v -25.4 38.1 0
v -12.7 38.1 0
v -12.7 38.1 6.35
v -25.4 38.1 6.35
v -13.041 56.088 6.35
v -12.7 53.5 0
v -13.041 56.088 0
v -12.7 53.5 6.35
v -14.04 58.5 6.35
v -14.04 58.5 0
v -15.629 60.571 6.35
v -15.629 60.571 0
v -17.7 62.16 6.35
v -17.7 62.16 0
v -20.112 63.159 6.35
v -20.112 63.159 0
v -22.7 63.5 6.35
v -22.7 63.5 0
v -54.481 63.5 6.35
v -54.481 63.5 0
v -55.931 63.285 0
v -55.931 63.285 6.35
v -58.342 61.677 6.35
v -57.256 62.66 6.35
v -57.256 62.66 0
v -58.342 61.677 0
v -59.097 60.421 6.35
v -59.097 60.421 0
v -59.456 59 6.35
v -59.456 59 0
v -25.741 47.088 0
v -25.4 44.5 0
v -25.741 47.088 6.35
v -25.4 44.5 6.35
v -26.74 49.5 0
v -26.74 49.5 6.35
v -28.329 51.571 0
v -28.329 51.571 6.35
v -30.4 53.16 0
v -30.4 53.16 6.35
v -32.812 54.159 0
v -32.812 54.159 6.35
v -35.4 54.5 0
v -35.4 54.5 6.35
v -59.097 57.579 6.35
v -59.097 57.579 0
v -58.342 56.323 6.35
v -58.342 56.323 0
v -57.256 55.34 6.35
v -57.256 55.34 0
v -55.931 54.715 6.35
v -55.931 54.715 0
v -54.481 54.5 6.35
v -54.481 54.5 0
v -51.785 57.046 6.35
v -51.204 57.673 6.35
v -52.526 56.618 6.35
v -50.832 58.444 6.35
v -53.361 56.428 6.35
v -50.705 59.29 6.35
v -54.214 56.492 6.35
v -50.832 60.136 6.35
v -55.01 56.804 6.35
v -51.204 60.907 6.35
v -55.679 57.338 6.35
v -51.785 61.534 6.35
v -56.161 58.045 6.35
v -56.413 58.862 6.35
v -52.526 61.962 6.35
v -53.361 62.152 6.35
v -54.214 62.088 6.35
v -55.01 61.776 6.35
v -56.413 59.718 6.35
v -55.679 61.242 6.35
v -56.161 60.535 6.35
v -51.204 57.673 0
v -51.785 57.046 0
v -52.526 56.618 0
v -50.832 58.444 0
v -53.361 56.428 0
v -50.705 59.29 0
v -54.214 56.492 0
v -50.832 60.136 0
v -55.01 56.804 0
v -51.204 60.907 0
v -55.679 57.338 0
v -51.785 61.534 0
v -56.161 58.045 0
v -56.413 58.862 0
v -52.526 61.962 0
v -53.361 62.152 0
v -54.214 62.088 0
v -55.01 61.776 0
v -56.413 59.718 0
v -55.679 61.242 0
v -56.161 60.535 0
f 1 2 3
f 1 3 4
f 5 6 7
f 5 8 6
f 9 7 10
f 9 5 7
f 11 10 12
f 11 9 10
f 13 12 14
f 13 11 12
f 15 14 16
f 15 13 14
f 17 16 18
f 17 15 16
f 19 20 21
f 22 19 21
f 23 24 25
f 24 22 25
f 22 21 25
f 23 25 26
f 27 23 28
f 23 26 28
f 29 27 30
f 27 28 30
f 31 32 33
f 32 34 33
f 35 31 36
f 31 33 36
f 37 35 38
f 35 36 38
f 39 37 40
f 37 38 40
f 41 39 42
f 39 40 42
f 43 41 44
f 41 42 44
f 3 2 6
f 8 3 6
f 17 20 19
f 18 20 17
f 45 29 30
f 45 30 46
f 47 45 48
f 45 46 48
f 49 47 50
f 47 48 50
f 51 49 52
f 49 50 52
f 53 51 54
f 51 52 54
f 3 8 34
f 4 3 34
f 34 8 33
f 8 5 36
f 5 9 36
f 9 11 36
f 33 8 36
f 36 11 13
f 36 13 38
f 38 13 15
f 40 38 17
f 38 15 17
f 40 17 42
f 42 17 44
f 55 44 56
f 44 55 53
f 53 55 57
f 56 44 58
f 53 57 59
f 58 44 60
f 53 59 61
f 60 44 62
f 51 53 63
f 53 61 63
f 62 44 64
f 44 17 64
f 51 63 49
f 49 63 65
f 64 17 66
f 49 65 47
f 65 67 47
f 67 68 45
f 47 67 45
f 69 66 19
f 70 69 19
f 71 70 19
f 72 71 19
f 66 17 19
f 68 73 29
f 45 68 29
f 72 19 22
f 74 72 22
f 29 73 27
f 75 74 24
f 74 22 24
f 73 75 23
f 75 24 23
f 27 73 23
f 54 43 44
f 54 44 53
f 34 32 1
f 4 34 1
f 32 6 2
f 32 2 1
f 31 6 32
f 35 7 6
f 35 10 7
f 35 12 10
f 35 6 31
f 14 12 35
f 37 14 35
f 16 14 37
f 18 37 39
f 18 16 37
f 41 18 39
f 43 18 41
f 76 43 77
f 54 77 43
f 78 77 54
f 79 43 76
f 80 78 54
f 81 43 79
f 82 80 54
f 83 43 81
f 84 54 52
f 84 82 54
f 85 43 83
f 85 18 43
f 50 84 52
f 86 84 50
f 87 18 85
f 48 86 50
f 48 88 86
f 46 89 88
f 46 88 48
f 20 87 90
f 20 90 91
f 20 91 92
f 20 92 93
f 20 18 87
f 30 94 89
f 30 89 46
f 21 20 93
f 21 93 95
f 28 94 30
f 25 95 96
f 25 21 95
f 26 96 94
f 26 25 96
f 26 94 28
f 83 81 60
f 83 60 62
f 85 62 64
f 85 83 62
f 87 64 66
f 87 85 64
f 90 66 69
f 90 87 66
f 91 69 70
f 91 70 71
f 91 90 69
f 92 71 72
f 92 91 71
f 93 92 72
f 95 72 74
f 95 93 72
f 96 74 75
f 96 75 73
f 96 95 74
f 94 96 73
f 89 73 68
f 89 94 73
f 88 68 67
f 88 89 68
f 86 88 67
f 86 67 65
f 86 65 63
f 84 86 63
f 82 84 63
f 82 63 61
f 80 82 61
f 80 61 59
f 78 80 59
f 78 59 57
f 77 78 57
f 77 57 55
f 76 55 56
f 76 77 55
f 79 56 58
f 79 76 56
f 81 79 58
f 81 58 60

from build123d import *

# Parameters (mm, degrees)
SKETCH1_R           = 2.8702
BOSS_EXTRUDE1_DEPTH = 6.35
FILLET1_R           = 10
FILLET2_R           = 5


with BuildPart() as part:
    # Sketch1 → Boss-Extrude1 (new body)
    with BuildSketch(Plane.XY):
        Polygon((-12.7, 38.1), (-25.4, 38.1), (-25.4, 44.45), (-25.4, 54.5), (-59.481100474, 54.5), (-59.481100474, 63.5), (-12.7, 63.5), (-12.7, 54.424612003), (-12.7, 44.45), align=None)
        with Locations((-53.575, 59.289941788)):
            Circle(SKETCH1_R, mode=Mode.SUBTRACT)
    extrude(amount=BOSS_EXTRUDE1_DEPTH)

    # Fillet1
    fillet1_edges = [part.edges().sort_by_distance(p)[0] for p in [
        (-25.4, 54.5, 3.175),
        (-12.7, 63.5, 3.175),
    ]]
    fillet(fillet1_edges, radius=FILLET1_R)

    # Fillet2
    # the kernel refuses this fillet: 5 mm, written as the material it takes off along each edge
    with BuildSketch(Plane(origin=(-59.481100474, 63.5, -12.5), x_dir=(0, -1, 0), z_dir=(0, 0, 1)), Plane(origin=(-59.481100474, 54.5, -12.5), x_dir=(1, 0, 0), z_dir=(0, 0, 1))) as fillet2_piece_1:
        with BuildLine():
            CenterArc((FILLET2_R, FILLET2_R), FILLET2_R, 180, 90)
            Line((0, FILLET2_R), (0, 0))
            Line((0, 0), (FILLET2_R, 0))
        make_face()
    extrude(amount=31.35, mode=Mode.SUBTRACT)


solid = part.part
